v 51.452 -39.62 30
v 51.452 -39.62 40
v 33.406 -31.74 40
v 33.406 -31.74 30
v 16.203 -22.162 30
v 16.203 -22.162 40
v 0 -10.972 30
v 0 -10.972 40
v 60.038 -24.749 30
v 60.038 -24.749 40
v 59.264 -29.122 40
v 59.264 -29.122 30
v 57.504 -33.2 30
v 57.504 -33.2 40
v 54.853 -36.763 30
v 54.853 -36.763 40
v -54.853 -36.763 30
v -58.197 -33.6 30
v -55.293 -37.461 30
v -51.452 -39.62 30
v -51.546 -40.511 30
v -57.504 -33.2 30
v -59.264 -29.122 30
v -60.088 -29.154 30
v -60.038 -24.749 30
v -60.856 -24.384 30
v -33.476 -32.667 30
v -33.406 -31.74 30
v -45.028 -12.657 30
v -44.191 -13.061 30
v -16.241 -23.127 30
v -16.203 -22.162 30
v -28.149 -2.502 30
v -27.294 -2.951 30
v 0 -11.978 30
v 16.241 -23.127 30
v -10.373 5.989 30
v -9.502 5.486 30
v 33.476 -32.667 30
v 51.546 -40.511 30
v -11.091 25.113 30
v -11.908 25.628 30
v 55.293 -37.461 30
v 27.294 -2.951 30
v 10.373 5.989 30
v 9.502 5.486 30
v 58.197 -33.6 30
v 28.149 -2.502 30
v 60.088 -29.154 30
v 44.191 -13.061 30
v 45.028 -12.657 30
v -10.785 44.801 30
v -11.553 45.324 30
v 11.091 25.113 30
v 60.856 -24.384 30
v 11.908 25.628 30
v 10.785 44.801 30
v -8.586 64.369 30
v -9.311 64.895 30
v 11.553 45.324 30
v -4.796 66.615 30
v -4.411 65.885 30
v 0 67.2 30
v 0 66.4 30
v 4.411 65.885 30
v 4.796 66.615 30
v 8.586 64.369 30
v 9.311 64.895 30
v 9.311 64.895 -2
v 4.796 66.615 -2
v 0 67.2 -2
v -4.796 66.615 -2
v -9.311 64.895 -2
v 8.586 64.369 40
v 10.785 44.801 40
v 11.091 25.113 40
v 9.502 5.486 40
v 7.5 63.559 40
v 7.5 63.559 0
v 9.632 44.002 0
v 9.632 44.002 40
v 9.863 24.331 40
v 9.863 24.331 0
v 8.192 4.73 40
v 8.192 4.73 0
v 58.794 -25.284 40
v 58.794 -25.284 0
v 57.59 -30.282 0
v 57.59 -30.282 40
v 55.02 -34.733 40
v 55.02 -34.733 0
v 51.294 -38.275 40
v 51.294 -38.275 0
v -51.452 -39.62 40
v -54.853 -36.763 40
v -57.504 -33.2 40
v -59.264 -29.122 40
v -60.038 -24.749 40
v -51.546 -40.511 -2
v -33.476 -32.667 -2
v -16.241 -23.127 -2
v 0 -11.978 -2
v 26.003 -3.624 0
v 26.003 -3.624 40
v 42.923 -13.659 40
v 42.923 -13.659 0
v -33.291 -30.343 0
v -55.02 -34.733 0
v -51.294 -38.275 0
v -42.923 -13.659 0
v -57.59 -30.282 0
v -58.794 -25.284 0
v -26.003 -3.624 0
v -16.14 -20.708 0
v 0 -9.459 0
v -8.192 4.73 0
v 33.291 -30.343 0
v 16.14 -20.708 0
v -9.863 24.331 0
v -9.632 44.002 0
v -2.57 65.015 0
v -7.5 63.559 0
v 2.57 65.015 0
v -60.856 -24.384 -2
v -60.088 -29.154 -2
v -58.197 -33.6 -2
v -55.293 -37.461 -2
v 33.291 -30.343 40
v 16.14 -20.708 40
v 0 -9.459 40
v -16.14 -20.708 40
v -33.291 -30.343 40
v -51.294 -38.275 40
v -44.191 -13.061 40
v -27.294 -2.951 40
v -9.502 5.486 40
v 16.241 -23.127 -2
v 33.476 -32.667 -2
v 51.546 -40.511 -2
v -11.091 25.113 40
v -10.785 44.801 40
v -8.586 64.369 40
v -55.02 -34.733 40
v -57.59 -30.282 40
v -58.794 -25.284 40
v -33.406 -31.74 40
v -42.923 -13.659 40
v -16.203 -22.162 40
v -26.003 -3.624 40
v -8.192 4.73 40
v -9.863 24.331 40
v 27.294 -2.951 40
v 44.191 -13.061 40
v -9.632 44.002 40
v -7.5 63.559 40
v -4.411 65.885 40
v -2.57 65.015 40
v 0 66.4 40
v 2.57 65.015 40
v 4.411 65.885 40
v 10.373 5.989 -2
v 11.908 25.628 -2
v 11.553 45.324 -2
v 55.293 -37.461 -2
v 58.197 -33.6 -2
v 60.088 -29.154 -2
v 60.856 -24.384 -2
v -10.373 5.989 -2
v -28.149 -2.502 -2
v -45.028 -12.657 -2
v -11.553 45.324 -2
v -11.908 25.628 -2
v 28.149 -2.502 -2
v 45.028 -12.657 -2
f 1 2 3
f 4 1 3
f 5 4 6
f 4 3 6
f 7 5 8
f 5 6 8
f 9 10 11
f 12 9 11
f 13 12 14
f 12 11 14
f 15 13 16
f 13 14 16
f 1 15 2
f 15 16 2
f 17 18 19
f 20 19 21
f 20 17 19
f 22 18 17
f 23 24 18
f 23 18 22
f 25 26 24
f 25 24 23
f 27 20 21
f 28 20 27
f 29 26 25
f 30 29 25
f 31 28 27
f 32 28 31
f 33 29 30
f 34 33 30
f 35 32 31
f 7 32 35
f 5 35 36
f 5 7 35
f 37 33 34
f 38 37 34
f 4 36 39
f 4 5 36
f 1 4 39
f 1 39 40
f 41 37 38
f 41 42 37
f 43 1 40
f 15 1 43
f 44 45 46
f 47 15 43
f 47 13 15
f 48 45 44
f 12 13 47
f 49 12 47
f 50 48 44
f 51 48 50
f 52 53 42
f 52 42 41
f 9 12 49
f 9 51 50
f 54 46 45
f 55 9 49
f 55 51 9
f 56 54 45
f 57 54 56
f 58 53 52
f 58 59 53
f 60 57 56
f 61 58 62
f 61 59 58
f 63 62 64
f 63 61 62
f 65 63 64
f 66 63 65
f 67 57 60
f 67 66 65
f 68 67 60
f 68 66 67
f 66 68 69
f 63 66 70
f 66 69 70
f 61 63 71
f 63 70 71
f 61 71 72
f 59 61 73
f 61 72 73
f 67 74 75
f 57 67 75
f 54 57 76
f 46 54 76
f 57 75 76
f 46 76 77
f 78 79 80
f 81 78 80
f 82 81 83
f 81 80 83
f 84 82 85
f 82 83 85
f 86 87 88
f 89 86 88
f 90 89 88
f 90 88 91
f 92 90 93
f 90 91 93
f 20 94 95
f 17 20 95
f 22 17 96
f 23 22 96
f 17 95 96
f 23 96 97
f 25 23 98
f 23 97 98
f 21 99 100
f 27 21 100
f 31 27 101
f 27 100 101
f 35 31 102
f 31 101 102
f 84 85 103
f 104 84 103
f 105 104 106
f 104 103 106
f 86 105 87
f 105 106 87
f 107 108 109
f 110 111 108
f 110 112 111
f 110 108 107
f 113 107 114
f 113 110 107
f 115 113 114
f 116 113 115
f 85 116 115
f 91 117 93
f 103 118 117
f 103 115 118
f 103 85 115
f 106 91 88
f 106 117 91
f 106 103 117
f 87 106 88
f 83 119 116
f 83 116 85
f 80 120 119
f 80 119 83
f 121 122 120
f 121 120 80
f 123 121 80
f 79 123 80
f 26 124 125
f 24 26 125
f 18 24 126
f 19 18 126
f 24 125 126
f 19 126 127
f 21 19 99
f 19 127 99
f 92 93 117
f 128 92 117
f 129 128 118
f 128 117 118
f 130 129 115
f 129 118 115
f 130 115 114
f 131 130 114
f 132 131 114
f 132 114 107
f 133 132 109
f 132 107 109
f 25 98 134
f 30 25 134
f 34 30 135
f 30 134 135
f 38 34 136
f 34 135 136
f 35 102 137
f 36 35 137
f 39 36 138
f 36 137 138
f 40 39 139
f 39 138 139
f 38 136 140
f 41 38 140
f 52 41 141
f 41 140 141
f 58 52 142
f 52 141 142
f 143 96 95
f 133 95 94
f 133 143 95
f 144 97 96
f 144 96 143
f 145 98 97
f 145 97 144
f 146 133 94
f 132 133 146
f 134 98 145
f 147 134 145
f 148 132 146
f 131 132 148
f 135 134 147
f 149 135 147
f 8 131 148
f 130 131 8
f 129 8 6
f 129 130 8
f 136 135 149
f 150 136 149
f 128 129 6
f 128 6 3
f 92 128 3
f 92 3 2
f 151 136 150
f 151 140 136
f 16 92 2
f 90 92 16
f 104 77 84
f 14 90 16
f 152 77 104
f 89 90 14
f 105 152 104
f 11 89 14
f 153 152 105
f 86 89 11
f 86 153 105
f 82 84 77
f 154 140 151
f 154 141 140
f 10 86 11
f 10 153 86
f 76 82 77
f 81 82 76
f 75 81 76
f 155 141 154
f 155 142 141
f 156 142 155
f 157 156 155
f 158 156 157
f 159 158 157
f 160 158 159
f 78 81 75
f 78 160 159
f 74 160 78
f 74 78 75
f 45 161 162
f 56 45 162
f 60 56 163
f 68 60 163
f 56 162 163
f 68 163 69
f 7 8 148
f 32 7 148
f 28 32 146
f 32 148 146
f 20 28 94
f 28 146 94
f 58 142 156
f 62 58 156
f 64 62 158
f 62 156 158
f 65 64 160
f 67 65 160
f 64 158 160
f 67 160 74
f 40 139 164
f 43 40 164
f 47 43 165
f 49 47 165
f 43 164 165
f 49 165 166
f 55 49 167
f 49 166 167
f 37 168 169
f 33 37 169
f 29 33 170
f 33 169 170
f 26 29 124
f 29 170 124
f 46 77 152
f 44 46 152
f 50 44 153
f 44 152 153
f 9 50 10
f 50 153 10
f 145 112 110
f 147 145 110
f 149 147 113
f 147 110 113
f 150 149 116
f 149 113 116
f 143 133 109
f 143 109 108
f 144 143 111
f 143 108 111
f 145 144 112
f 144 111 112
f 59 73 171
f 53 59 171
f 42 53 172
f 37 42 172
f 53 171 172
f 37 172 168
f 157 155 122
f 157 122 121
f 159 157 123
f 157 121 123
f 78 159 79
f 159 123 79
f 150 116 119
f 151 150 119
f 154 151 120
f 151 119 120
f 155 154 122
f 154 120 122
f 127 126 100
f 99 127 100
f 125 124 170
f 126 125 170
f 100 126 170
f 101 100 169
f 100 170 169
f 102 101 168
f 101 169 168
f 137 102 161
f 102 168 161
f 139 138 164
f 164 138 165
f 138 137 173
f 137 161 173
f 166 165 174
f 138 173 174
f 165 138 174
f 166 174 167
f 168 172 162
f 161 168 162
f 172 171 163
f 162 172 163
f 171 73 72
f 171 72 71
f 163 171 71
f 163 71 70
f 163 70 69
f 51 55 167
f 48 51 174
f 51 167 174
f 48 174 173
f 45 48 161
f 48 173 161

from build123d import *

# Parameters (mm, degrees)
F0_R     = 7.5
F1_DEPTH = 2
F2_DEPTH = 40
F4_DEPTH = 10


with BuildPart() as f1:
    # F0 (on Top) → F1 (new body)
    with BuildSketch(Plane.XY):
        with BuildLine():
            ThreePointArc((60.856366, -24.384369), (36.710284, -7.376819), (10.3731, 5.988912))
            ThreePointArc((10.3731, 5.988912), (11.966629, 35.480448), (9.3107, 64.895344))
            ThreePointArc((9.3107, 64.895344), (0, 67.2), (-9.3107, 64.895344))
            ThreePointArc((-9.3107, 64.895344), (-11.966629, 35.480448), (-10.3731, 5.988912))
            ThreePointArc((-10.3731, 5.988912), (-36.710284, -7.376819), (-60.856366, -24.384369))
            ThreePointArc((-60.856366, -24.384369), (-58.196907, -33.6), (-51.545666, -40.510974))
            ThreePointArc((-51.545666, -40.510974), (-24.743655, -28.103629), (0, -11.977824))
            ThreePointArc((0, -11.977824), (24.743655, -28.103629), (51.545666, -40.510974))
            ThreePointArc((51.545666, -40.510974), (58.196907, -33.6), (60.856366, -24.384369))
        make_face()
        with BuildLine():
            ThreePointArc((-7.5, 63.559028), (0, 65.2), (7.5, 63.559028))
            ThreePointArc((7.5, 63.559028), (9.985947, 34.169463), (8.191847, 4.729565))
            ThreePointArc((8.191847, 4.729565), (34.584597, -8.436648), (58.793733, -25.284323))
            ThreePointArc((58.793733, -25.284323), (56.464856, -32.6), (51.293733, -38.274704))
            ThreePointArc((51.293733, -38.274704), (24.59865, -25.732816), (0, -9.45913))
            ThreePointArc((0, -9.45913), (-24.59865, -25.732816), (-51.293733, -38.274704))
            ThreePointArc((-51.293733, -38.274704), (-56.464856, -32.6), (-58.793733, -25.284323))
            ThreePointArc((-58.793733, -25.284323), (-34.584597, -8.436648), (-8.191847, 4.729565))
            ThreePointArc((-8.191847, 4.729565), (-9.985947, 34.169463), (-7.5, 63.559028))
        make_face(mode=Mode.SUBTRACT)
        with BuildLine():
            ThreePointArc((8.191847, 4.729565), (9.985947, 34.169463), (7.5, 63.559028))
            ThreePointArc((7.5, 63.559028), (0, 65.2), (-7.5, 63.559028))
            ThreePointArc((-7.5, 63.559028), (-9.985947, 34.169463), (-8.191847, 4.729565))
            ThreePointArc((-8.191847, 4.729565), (-34.584597, -8.436648), (-58.793733, -25.284323))
            ThreePointArc((-58.793733, -25.284323), (-56.464856, -32.6), (-51.293733, -38.274704))
            ThreePointArc((-51.293733, -38.274704), (-24.59865, -25.732816), (0, -9.45913))
            ThreePointArc((0, -9.45913), (24.59865, -25.732816), (51.293733, -38.274704))
            ThreePointArc((51.293733, -38.274704), (56.464856, -32.6), (58.793733, -25.284323))
            ThreePointArc((58.793733, -25.284323), (34.584597, -8.436648), (8.191847, 4.729565))
        make_face()
        Circle(F0_R, mode=Mode.SUBTRACT)
        Circle(F0_R)
    extrude(amount=-F1_DEPTH)

    # F0 (on Top) → F2 (join)
    with BuildSketch(Plane.XY):
        with BuildLine():
            ThreePointArc((60.856366, -24.384369), (36.710284, -7.376819), (10.3731, 5.988912))
            ThreePointArc((10.3731, 5.988912), (11.966629, 35.480448), (9.3107, 64.895344))
            ThreePointArc((9.3107, 64.895344), (0, 67.2), (-9.3107, 64.895344))
            ThreePointArc((-9.3107, 64.895344), (-11.966629, 35.480448), (-10.3731, 5.988912))
            ThreePointArc((-10.3731, 5.988912), (-36.710284, -7.376819), (-60.856366, -24.384369))
            ThreePointArc((-60.856366, -24.384369), (-58.196907, -33.6), (-51.545666, -40.510974))
            ThreePointArc((-51.545666, -40.510974), (-24.743655, -28.103629), (0, -11.977824))
            ThreePointArc((0, -11.977824), (24.743655, -28.103629), (51.545666, -40.510974))
            ThreePointArc((51.545666, -40.510974), (58.196907, -33.6), (60.856366, -24.384369))
        make_face()
        with BuildLine():
            ThreePointArc((-7.5, 63.559028), (0, 65.2), (7.5, 63.559028))
            ThreePointArc((7.5, 63.559028), (9.985947, 34.169463), (8.191847, 4.729565))
            ThreePointArc((8.191847, 4.729565), (34.584597, -8.436648), (58.793733, -25.284323))
            ThreePointArc((58.793733, -25.284323), (56.464856, -32.6), (51.293733, -38.274704))
            ThreePointArc((51.293733, -38.274704), (24.59865, -25.732816), (0, -9.45913))
            ThreePointArc((0, -9.45913), (-24.59865, -25.732816), (-51.293733, -38.274704))
            ThreePointArc((-51.293733, -38.274704), (-56.464856, -32.6), (-58.793733, -25.284323))
            ThreePointArc((-58.793733, -25.284323), (-34.584597, -8.436648), (-8.191847, 4.729565))
            ThreePointArc((-8.191847, 4.729565), (-9.985947, 34.169463), (-7.5, 63.559028))
        make_face(mode=Mode.SUBTRACT)
    extrude(amount=F2_DEPTH)

    # F3 (on face) → F4 (cut)
    with BuildSketch(Plane.XY.offset(40)):
        with BuildLine():
            ThreePointArc((-51.545666, -40.510974), (-24.743655, -28.103629), (0, -11.977824))
            ThreePointArc((0, -11.977824), (24.743655, -28.103629), (51.545666, -40.510974))
            ThreePointArc((51.545666, -40.510974), (58.196907, -33.6), (60.856366, -24.384369))
            ThreePointArc((60.856366, -24.384369), (36.710284, -7.376819), (10.3731, 5.988912))
            ThreePointArc((10.3731, 5.988912), (11.966629, 35.480448), (9.3107, 64.895344))
            ThreePointArc((9.3107, 64.895344), (0, 67.2), (-9.3107, 64.895344))
            ThreePointArc((-9.3107, 64.895344), (-11.966629, 35.480448), (-10.3731, 5.988912))
            ThreePointArc((-10.3731, 5.988912), (-36.710284, -7.376819), (-60.856366, -24.384369))
            ThreePointArc((-60.856366, -24.384369), (-58.196907, -33.6), (-51.545666, -40.510974))
        make_face()
        with BuildLine():
            ThreePointArc((51.451933, -39.619813), (24.689038, -27.158291), (0, -10.972078))
            ThreePointArc((0, -10.972078), (-24.689038, -27.158291), (-51.451933, -39.619813))
            ThreePointArc((-51.451933, -39.619813), (-57.504087, -33.2), (-60.037731, -24.748774))
            ThreePointArc((-60.037731, -24.748774), (-35.864289, -7.802188), (-9.502098, 5.486039))
            ThreePointArc((-9.502098, 5.486039), (-11.175251, 34.960479), (-8.585798, 64.368588))
            ThreePointArc((-8.585798, 64.368588), (0, 66.4), (8.585798, 64.368588))
            ThreePointArc((8.585798, 64.368588), (11.175251, 34.960479), (9.502098, 5.486039))
            ThreePointArc((9.502098, 5.486039), (35.864289, -7.802188), (60.037731, -24.748774))
            ThreePointArc((60.037731, -24.748774), (57.504087, -33.2), (51.451933, -39.619813))
        make_face(mode=Mode.SUBTRACT)
    extrude(amount=-F4_DEPTH, mode=Mode.SUBTRACT)


solid = f1.part
